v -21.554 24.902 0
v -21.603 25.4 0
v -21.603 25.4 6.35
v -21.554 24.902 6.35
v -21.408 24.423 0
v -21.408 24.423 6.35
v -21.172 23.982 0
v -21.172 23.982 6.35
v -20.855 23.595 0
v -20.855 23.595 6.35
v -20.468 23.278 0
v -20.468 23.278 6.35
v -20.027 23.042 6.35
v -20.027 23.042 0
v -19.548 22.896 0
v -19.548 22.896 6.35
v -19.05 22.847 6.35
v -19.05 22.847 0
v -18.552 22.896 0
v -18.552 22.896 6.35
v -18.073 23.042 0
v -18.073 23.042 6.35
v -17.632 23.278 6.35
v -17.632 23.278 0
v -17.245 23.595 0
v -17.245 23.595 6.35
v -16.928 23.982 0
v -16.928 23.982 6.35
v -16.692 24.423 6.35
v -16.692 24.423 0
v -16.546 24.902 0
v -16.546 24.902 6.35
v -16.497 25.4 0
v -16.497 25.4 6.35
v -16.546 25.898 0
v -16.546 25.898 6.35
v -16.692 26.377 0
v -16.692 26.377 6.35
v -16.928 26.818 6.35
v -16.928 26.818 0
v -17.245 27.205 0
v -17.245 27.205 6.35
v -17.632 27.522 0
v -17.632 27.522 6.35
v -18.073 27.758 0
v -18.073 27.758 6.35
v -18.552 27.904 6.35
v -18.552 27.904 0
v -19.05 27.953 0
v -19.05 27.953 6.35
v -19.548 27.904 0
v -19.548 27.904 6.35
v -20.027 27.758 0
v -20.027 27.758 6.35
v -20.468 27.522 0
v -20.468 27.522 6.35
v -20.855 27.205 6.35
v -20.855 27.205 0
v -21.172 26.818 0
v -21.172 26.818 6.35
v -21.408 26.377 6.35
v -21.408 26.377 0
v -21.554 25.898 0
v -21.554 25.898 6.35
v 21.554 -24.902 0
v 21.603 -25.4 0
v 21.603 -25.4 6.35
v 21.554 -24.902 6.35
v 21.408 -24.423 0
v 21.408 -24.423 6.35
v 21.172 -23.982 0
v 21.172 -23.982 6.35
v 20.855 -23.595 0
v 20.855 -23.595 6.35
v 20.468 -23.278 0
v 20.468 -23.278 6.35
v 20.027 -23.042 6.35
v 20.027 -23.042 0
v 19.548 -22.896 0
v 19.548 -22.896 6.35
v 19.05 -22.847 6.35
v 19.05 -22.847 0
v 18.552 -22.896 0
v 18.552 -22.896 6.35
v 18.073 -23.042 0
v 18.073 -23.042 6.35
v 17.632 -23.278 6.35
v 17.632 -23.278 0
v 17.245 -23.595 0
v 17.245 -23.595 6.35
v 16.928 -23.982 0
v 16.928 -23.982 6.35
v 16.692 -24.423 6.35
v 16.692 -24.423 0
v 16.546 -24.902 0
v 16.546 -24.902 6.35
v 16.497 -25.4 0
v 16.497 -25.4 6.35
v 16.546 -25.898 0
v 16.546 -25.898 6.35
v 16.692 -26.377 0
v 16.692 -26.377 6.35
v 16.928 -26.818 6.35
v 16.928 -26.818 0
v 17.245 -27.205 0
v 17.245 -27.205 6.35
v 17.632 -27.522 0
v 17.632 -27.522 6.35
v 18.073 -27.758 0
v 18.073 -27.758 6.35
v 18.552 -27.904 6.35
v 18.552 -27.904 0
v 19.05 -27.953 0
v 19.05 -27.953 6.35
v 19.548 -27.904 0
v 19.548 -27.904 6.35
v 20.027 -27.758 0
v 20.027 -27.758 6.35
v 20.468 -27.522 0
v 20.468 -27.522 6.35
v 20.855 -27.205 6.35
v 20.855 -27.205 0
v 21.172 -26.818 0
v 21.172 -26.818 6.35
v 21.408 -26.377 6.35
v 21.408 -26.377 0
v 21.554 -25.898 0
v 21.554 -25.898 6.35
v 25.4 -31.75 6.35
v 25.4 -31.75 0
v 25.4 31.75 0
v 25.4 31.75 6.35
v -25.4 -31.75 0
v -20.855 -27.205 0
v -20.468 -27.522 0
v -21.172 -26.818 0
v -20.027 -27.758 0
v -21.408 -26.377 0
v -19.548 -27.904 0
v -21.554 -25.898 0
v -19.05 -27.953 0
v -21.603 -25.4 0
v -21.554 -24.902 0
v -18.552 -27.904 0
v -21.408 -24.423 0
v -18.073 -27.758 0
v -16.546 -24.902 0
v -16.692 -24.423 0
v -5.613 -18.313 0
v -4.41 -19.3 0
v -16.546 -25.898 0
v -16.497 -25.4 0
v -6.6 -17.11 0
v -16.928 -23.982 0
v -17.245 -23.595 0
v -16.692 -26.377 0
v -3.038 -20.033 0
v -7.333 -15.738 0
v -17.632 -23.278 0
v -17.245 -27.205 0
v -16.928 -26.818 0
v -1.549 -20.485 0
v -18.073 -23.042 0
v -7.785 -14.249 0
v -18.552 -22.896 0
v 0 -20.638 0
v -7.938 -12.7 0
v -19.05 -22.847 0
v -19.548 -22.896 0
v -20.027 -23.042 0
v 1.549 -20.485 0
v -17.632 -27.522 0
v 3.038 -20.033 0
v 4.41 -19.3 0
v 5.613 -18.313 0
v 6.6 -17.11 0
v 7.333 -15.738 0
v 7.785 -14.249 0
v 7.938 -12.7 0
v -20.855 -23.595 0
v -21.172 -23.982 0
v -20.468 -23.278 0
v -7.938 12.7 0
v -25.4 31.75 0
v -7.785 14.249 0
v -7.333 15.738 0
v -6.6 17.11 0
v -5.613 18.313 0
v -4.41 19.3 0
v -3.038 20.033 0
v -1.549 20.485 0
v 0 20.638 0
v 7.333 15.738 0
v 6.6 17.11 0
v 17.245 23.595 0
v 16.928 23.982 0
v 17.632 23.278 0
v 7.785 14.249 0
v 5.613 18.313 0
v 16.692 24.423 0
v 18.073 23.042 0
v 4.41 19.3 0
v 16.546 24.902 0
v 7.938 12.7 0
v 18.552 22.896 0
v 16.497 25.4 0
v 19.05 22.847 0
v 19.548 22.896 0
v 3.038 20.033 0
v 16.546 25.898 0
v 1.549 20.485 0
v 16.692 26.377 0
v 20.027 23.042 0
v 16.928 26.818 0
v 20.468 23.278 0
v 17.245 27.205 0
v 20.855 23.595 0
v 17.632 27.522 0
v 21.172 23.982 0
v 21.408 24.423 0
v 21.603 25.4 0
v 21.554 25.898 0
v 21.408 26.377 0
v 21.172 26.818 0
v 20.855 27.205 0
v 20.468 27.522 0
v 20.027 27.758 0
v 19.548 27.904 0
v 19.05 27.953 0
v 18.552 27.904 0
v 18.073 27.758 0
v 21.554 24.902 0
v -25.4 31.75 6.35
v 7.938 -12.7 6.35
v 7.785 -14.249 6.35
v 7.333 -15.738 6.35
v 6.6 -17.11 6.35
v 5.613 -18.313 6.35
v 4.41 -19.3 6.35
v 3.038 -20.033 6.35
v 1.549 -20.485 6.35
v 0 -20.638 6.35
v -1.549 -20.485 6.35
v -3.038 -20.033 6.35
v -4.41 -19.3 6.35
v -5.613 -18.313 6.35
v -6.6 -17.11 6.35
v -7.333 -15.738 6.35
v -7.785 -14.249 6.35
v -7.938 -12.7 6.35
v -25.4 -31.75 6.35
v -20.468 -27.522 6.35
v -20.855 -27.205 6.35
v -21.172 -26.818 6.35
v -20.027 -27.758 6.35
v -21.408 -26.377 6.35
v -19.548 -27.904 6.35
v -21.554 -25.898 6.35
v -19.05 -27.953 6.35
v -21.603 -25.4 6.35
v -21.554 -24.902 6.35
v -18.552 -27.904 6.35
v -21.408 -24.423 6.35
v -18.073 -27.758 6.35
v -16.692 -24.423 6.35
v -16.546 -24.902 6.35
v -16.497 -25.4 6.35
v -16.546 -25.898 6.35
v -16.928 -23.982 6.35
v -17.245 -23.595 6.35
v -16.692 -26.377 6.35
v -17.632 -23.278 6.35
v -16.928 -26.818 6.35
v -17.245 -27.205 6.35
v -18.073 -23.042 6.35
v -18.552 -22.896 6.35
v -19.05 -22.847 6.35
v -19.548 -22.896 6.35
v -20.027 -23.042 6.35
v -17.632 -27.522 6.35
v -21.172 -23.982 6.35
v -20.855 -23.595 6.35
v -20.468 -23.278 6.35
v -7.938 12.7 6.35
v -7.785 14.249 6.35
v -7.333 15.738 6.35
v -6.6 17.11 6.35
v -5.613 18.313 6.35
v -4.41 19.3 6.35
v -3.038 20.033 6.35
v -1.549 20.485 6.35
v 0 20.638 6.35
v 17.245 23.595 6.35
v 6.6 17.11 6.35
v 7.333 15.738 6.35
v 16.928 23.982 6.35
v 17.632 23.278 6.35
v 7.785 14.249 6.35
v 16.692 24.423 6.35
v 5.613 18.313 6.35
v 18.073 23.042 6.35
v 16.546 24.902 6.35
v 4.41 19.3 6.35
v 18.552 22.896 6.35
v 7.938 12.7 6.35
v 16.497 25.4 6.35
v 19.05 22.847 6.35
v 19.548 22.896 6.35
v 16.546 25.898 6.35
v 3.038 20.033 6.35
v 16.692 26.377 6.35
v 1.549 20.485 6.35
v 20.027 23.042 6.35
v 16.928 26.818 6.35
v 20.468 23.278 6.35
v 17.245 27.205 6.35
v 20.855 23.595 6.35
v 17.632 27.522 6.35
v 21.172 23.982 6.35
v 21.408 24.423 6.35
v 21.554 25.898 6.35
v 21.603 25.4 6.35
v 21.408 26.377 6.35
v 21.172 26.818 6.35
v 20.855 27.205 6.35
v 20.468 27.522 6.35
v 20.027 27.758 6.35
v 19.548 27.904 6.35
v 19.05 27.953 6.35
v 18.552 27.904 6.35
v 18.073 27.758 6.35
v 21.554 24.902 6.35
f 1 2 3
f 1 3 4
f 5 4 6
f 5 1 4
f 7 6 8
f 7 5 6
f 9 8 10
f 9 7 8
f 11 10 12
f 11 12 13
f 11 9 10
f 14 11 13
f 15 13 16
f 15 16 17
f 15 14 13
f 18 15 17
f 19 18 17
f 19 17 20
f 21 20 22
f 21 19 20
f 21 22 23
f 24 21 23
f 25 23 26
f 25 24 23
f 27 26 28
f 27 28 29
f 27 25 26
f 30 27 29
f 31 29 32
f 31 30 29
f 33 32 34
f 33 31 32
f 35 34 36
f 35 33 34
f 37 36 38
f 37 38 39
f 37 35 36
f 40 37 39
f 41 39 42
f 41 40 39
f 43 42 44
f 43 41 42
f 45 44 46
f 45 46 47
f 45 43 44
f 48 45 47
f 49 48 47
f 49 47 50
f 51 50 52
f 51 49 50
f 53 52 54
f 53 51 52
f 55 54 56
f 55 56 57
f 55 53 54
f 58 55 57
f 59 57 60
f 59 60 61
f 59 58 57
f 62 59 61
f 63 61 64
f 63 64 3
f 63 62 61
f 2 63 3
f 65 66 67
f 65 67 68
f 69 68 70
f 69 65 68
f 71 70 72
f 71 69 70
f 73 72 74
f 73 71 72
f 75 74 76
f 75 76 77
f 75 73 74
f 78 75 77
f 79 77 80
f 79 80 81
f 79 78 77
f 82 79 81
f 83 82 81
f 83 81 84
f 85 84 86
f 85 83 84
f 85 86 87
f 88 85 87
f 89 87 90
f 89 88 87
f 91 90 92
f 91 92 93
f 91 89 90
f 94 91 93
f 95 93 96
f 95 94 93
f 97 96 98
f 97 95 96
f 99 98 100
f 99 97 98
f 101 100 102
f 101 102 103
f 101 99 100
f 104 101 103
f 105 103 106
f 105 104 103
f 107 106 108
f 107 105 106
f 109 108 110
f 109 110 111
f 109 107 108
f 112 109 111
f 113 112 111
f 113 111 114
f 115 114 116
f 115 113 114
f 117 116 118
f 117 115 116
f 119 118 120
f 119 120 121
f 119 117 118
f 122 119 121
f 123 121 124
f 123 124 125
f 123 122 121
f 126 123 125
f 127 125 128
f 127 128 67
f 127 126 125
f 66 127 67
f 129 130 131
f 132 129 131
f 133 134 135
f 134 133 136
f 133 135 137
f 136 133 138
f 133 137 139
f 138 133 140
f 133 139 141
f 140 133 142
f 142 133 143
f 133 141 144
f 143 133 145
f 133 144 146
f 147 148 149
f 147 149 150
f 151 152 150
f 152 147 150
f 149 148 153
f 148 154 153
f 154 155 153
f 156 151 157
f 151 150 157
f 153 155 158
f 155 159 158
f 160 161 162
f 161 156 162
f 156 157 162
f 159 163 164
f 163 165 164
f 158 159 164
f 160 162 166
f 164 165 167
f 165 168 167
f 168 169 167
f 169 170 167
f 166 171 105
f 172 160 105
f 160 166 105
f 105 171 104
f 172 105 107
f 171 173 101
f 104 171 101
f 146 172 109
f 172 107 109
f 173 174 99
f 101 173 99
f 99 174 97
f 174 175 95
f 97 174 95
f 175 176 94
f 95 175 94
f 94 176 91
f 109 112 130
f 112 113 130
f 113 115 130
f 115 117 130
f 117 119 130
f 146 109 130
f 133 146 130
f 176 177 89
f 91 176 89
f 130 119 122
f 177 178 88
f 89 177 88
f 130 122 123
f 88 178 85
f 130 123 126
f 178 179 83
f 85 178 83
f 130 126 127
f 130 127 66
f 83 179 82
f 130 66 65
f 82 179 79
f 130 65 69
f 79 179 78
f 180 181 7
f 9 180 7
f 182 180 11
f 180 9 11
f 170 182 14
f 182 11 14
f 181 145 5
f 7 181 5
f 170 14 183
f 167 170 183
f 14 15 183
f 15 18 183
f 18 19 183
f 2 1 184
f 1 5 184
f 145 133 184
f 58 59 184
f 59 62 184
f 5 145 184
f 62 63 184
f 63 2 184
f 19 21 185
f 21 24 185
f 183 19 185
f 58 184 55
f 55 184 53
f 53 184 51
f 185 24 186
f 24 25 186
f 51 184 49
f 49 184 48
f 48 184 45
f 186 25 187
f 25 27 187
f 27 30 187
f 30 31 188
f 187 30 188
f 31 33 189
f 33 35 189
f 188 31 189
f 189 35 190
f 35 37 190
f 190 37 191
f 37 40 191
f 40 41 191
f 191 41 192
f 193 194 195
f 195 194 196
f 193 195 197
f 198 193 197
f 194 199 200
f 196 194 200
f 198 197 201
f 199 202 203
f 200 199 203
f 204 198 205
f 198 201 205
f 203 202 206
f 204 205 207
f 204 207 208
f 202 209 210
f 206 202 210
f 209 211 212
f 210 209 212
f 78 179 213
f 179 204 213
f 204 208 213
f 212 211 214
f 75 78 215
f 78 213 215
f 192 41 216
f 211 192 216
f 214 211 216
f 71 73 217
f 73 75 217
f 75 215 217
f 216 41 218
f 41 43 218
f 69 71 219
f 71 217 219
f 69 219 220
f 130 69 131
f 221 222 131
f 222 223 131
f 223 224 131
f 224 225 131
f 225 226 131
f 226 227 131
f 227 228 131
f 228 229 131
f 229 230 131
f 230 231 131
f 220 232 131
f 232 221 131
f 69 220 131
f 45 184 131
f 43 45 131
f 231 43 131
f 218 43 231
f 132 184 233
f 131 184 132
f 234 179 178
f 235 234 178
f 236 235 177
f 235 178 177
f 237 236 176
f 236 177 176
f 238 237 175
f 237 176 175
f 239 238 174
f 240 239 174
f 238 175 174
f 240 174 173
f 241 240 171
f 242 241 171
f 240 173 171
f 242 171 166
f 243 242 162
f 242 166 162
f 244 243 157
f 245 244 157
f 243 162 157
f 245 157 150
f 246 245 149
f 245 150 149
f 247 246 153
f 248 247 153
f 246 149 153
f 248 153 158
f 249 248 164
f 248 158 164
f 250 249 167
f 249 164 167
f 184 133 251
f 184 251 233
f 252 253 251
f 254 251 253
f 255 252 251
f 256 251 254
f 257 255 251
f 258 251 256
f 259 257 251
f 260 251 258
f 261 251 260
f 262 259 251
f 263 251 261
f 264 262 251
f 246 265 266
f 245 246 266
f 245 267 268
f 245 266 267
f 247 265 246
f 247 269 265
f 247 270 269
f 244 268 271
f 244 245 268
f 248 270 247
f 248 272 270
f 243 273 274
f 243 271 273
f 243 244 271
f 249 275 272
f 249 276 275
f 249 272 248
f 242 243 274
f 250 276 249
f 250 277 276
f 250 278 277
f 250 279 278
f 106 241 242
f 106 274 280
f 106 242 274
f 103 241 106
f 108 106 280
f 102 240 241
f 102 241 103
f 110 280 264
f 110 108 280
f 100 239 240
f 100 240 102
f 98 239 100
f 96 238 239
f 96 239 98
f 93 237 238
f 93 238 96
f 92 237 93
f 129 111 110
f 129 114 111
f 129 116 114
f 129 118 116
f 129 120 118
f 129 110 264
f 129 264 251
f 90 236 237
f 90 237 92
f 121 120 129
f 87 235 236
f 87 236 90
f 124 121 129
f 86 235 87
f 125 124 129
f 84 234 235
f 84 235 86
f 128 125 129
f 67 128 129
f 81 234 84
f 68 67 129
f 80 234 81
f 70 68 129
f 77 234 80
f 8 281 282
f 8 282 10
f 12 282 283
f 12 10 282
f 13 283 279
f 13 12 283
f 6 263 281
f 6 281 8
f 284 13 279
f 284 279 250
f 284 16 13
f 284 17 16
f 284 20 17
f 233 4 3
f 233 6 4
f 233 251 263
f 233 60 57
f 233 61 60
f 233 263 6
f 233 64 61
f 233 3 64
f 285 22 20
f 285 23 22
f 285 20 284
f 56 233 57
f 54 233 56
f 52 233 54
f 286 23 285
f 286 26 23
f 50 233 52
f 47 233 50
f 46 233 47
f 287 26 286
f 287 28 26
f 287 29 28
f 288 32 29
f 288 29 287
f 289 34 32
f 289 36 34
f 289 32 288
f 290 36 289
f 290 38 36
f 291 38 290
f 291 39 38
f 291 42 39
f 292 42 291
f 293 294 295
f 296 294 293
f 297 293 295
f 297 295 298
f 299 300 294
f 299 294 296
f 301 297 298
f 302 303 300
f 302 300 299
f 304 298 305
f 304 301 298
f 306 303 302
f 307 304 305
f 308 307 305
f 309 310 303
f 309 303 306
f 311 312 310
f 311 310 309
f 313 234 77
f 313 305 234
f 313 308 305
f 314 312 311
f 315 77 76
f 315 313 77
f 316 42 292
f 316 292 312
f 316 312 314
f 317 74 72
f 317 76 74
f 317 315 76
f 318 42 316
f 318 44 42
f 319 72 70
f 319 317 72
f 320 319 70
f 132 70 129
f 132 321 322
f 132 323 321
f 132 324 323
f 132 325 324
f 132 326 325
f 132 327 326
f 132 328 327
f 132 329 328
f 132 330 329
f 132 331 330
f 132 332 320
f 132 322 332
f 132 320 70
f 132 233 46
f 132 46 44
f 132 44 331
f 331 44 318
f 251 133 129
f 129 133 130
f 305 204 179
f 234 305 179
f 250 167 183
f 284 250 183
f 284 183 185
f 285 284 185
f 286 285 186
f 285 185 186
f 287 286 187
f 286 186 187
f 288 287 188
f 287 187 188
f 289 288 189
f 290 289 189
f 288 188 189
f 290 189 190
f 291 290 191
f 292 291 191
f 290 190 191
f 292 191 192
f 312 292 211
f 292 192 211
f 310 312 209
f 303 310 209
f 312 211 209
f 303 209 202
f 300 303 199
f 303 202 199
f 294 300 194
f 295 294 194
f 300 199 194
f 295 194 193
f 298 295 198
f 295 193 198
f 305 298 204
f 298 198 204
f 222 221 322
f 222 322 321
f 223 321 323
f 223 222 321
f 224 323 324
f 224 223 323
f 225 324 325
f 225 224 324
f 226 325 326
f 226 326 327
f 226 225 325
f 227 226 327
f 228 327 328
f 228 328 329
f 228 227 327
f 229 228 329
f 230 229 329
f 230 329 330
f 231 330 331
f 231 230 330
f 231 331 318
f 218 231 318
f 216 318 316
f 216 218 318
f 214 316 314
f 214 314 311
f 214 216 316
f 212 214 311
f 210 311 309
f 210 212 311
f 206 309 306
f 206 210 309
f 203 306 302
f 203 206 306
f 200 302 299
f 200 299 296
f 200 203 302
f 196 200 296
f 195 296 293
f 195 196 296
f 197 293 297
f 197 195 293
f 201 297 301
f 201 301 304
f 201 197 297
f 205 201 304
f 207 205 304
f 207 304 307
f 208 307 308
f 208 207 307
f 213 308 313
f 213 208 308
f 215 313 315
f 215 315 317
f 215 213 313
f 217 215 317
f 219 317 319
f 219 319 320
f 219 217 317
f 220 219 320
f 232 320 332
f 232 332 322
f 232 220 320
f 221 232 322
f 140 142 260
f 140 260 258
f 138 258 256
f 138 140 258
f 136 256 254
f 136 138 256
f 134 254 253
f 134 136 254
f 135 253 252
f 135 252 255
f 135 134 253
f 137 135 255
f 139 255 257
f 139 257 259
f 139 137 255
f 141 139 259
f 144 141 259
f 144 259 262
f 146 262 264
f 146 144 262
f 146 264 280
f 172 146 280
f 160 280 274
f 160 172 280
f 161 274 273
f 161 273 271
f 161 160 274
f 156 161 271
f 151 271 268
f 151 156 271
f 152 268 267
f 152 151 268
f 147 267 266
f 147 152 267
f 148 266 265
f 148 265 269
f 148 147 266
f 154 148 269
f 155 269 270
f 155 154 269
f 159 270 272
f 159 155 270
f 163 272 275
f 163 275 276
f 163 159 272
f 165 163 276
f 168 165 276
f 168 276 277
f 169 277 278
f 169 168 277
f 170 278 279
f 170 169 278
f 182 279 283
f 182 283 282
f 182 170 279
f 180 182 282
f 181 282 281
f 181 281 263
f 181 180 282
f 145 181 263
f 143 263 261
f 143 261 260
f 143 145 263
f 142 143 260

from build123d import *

# Parameters (mm, degrees)
SKETCH1_W           = 50.8
SKETCH1_H           = 63.5
SKETCH1_R           = 2.5527
BOSS_EXTRUDE1_DEPTH = 6.35


with BuildPart() as part:
    # Sketch1 → Boss-Extrude1 (new body)
    with BuildSketch(Plane.XY):
        Rectangle(SKETCH1_W, SKETCH1_H)
        with Locations(Location((-19.05, 25.4, 0), (0, 0, 180))):
            Circle(SKETCH1_R, mode=Mode.SUBTRACT)
        with Locations((19.05, 25.4)):
            Circle(SKETCH1_R, mode=Mode.SUBTRACT)
        with Locations((19.05, -25.4)):
            Circle(SKETCH1_R, mode=Mode.SUBTRACT)
        with Locations(Location((-19.05, -25.4, 0), (0, 0, 180))):
            Circle(SKETCH1_R, mode=Mode.SUBTRACT)
        with BuildLine():
            Line((-7.9375, -12.7), (-7.9375, 12.7))
            ThreePointArc((-7.9375, 12.7), (0, 20.6375), (7.9375, 12.7))
            Line((7.9375, 12.7), (7.9375, -12.7))
            ThreePointArc((7.9375, -12.7), (0, -20.6375), (-7.9375, -12.7))
        make_face(mode=Mode.SUBTRACT)
    extrude(amount=BOSS_EXTRUDE1_DEPTH)


solid = part.part
